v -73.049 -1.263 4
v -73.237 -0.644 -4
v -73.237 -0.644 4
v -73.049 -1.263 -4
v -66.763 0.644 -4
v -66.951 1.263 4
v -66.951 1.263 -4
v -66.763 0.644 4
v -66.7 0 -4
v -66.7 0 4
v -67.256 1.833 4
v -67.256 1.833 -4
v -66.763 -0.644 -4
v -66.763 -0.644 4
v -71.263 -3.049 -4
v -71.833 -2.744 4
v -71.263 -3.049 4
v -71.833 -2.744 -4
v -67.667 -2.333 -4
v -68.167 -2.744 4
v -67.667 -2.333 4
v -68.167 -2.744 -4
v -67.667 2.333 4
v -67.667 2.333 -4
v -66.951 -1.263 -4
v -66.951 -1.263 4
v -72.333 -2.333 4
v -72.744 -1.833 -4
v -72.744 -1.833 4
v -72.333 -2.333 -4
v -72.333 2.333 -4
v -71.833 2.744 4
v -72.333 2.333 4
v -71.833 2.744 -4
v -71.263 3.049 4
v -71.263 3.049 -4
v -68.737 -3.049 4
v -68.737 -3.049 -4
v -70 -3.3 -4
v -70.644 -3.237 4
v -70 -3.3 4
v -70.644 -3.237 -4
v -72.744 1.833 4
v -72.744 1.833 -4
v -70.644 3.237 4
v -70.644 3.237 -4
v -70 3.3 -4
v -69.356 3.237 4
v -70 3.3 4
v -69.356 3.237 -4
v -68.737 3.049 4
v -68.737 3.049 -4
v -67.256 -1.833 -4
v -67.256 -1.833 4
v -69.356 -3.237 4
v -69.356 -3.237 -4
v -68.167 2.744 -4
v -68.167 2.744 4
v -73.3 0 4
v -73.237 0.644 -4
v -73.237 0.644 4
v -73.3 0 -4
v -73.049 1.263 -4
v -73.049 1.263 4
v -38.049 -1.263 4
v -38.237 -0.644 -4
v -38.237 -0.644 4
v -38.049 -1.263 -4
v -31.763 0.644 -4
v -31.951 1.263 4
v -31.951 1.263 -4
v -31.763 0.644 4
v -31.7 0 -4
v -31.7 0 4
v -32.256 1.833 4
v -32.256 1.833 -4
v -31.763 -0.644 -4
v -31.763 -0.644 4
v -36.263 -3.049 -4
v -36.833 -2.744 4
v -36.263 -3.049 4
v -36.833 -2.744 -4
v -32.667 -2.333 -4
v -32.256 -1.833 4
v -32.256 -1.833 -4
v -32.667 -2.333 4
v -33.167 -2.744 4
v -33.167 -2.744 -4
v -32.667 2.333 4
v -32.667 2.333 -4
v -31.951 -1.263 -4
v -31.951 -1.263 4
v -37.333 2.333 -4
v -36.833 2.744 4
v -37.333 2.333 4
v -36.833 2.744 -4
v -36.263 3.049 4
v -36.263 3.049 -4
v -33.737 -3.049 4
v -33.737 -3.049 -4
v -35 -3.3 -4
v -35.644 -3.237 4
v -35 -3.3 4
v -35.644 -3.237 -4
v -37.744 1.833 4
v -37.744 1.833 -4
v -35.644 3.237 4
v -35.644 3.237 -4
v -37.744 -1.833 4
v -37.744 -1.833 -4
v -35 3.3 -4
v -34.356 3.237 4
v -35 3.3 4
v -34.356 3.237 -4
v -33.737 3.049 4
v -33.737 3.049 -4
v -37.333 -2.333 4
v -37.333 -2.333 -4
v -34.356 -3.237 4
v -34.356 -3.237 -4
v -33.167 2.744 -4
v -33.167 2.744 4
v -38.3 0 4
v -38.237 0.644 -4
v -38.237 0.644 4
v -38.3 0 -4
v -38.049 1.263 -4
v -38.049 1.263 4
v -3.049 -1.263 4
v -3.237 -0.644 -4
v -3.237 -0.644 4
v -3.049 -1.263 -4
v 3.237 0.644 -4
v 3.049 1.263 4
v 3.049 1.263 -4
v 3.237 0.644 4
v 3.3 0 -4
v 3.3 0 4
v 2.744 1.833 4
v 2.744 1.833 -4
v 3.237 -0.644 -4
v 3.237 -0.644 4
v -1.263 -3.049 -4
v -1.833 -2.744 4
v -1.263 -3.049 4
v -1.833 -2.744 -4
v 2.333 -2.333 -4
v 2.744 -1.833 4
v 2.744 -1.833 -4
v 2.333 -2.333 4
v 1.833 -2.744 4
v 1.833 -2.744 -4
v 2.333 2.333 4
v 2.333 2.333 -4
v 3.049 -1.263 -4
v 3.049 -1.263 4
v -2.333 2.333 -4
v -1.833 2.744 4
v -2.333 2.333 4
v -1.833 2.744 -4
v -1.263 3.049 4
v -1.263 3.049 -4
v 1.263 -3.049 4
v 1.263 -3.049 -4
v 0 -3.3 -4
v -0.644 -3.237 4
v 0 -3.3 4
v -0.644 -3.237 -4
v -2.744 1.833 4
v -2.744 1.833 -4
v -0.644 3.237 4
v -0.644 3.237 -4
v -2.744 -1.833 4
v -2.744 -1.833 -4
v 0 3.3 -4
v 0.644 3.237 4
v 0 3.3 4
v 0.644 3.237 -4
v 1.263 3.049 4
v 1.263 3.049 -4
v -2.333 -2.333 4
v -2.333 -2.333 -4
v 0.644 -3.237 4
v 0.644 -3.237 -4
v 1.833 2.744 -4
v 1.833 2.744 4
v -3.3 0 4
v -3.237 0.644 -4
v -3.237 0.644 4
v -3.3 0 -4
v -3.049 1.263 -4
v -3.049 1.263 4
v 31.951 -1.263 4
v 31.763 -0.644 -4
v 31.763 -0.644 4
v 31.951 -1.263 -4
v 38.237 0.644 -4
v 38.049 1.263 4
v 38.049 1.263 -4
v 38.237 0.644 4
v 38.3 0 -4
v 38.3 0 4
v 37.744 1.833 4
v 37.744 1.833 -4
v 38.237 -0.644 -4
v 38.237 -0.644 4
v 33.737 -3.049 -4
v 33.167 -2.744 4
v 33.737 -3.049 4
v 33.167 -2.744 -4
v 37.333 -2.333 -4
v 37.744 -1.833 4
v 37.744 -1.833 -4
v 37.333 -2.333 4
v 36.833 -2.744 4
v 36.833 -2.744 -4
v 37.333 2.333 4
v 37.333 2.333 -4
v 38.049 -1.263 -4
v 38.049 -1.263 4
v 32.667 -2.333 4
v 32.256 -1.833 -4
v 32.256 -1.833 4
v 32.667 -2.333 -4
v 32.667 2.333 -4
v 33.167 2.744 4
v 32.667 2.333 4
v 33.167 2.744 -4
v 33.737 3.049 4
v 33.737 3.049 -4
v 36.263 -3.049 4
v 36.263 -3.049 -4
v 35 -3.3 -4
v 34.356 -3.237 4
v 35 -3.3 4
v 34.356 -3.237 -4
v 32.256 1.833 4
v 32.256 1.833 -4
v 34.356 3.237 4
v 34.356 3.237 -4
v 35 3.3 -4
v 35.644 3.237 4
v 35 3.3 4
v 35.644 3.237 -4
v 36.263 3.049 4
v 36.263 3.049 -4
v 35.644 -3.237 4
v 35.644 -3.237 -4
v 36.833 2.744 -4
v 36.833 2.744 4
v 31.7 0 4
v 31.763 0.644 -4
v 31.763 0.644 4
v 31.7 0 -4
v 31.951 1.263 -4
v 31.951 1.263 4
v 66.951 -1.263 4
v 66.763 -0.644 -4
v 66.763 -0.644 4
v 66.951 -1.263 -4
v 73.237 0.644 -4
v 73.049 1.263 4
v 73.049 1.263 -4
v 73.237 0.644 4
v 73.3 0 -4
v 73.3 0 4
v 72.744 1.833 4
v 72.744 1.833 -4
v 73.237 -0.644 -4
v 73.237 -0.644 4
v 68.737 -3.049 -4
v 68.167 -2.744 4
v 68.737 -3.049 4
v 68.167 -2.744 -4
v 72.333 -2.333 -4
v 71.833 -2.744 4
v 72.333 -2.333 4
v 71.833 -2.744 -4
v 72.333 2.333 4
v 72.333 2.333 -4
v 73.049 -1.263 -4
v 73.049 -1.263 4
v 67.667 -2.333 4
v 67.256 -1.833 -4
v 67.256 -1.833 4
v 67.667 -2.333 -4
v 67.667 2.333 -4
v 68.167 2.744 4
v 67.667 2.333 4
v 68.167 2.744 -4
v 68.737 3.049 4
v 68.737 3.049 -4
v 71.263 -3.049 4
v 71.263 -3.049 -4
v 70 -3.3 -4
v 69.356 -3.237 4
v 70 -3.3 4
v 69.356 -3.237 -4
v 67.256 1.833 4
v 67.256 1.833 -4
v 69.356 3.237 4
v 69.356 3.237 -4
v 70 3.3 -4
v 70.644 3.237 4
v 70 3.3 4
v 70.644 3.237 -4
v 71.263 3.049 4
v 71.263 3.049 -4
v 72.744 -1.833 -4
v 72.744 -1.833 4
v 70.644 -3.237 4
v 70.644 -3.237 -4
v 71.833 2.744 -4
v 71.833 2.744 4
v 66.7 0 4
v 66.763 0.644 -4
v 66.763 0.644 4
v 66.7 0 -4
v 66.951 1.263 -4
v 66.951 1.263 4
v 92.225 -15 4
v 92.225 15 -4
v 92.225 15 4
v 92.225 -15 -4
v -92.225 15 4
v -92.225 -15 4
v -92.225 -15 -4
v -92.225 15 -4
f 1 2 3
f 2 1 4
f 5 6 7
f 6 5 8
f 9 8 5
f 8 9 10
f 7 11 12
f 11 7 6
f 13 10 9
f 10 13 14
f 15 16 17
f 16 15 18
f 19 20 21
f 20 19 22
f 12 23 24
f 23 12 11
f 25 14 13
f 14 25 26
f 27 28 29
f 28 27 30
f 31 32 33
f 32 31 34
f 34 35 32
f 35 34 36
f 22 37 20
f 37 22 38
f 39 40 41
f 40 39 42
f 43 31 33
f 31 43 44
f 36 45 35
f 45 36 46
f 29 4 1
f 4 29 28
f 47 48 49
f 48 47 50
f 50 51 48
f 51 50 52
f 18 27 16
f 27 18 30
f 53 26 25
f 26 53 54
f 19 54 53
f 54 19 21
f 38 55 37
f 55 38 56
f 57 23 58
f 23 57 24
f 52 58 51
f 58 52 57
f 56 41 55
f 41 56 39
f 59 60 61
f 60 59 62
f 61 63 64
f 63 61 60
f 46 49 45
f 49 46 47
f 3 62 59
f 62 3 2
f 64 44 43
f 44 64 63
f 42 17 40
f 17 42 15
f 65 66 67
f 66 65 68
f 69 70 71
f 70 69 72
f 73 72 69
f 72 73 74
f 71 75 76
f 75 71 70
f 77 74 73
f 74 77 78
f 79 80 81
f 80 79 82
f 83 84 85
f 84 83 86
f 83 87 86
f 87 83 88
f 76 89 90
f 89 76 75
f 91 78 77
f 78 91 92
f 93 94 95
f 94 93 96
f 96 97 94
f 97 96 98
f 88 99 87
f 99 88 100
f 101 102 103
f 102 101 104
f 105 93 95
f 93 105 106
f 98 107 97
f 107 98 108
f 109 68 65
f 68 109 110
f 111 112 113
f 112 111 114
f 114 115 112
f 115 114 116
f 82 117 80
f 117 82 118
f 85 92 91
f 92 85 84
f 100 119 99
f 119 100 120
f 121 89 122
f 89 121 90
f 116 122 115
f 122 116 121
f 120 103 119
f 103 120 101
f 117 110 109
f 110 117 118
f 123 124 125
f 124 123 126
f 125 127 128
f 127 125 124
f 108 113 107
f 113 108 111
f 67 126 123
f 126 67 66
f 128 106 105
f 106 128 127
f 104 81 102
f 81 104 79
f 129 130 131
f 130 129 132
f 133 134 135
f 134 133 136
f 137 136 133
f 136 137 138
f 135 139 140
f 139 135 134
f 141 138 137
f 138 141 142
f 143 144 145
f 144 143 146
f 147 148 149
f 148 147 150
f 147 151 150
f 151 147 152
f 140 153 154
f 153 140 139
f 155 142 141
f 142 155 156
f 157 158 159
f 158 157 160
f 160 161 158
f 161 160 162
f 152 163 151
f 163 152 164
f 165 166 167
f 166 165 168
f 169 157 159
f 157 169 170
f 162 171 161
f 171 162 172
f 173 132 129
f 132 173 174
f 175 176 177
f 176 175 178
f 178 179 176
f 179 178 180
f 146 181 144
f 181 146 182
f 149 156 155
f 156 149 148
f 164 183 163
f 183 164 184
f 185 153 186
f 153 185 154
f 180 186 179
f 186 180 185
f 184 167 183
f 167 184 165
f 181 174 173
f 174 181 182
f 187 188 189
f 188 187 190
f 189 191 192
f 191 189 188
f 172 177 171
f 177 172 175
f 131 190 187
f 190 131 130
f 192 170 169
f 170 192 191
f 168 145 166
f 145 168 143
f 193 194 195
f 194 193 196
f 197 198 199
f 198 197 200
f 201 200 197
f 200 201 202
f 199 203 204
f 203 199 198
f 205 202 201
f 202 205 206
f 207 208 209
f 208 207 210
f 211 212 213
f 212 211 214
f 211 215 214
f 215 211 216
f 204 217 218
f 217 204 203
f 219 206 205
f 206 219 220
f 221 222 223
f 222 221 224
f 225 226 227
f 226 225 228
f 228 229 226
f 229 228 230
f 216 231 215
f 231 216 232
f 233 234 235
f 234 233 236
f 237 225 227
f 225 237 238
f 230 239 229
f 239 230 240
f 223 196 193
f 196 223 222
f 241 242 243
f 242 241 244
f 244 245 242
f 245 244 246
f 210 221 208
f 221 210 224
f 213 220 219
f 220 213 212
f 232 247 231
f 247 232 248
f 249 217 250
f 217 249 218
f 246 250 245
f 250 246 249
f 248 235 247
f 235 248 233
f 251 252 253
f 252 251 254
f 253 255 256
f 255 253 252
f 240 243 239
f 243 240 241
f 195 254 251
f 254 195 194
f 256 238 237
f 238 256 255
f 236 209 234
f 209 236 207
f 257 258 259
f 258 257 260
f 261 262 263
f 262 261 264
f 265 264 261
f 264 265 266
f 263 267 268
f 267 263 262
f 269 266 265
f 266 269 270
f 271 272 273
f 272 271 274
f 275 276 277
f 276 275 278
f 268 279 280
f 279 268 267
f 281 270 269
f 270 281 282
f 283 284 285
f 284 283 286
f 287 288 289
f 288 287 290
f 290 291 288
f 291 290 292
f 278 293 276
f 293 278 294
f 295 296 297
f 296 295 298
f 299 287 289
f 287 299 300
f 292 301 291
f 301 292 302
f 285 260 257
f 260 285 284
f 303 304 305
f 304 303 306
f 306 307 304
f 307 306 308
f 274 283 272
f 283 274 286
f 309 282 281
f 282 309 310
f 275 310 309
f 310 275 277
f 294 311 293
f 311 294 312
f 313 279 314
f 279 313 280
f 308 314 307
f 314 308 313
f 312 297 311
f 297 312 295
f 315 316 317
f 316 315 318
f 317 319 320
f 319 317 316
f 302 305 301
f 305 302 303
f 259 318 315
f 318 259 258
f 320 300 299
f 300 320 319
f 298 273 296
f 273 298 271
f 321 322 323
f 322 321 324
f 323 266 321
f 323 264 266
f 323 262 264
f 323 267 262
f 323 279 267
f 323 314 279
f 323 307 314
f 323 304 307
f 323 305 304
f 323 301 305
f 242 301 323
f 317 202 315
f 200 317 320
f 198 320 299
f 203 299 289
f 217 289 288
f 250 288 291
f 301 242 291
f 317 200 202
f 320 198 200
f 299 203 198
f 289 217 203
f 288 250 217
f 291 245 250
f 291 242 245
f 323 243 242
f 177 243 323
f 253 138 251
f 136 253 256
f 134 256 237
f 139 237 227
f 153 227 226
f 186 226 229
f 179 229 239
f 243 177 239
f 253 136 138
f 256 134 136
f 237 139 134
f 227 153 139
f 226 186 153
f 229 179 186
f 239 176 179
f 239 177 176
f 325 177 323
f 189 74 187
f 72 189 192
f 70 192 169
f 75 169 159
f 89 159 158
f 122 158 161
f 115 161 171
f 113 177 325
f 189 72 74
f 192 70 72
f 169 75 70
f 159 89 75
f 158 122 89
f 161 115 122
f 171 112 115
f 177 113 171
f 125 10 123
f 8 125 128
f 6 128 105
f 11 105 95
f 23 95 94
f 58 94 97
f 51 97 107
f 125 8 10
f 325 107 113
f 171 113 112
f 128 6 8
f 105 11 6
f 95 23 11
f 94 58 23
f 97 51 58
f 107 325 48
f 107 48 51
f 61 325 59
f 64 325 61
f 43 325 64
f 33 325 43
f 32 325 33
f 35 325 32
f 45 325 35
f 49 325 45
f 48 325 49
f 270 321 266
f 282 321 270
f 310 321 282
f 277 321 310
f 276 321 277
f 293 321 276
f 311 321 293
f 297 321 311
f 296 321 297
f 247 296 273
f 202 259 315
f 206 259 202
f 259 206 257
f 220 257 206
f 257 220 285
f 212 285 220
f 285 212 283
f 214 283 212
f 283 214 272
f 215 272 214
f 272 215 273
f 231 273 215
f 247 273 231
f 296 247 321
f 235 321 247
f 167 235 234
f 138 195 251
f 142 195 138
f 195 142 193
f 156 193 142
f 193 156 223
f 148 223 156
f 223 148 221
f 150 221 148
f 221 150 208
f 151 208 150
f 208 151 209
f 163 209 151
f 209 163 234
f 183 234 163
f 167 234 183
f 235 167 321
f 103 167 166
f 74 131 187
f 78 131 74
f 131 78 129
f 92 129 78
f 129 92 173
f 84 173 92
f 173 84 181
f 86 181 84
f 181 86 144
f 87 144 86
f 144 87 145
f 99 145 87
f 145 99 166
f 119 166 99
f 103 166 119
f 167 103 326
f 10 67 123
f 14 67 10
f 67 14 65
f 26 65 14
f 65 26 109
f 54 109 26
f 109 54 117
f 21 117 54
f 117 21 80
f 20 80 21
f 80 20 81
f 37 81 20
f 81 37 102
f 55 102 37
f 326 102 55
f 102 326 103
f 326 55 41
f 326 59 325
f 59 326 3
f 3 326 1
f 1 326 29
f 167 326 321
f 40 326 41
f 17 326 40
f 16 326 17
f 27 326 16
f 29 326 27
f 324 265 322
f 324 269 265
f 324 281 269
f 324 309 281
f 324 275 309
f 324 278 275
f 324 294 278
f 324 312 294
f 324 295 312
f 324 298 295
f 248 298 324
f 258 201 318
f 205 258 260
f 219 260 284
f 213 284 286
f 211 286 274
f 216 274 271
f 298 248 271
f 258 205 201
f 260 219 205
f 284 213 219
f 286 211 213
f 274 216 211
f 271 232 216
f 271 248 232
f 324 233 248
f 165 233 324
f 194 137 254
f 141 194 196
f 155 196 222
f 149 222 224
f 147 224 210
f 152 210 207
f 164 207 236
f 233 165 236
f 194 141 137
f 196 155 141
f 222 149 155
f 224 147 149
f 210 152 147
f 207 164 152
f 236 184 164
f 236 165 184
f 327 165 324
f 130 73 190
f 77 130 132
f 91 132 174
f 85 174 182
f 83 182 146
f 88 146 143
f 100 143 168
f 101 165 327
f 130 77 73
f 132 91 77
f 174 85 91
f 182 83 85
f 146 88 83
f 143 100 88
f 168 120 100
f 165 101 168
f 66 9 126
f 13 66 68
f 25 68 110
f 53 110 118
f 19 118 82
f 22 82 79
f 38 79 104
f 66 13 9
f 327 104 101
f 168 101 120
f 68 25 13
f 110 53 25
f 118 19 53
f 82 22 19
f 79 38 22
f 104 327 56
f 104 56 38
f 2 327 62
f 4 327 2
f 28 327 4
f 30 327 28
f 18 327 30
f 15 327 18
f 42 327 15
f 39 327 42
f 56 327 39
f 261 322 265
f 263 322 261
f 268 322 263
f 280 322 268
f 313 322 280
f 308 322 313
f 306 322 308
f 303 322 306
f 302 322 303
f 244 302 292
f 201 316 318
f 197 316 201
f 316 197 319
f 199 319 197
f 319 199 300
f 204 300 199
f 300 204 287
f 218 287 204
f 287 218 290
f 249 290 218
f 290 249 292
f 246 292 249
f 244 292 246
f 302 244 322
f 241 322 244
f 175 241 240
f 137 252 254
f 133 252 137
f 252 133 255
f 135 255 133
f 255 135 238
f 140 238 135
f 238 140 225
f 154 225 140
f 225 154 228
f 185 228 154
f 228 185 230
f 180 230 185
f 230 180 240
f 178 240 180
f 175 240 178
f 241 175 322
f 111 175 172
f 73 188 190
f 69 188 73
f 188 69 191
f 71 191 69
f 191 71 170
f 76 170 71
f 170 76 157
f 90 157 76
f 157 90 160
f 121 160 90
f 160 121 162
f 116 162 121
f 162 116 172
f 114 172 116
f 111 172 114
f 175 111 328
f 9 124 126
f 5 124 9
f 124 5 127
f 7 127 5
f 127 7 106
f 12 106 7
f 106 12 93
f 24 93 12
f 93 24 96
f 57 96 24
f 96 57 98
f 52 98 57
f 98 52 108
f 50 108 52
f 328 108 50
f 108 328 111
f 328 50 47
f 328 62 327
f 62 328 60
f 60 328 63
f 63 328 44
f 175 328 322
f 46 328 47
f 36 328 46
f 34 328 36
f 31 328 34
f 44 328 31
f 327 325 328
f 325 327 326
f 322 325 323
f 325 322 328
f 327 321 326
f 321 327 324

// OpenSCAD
$fn = 32;

// ----------------------------------------------------------------------
// Hole bar, 5 x Ø6.6
// row layout, 22.225 mm edge offset
// ----------------------------------------------------------------------

// --- parameters (mm) ---
bar_w = 30;     // bar width (Y)
bar_t = 8;      // bar thickness (Z)
holes = 5;      // holes per row
hole_d = 6.6;   // hole diameter
edge = 22.225;  // offset from the bar end to the first hole
pitch = 35;     // pitch between neighbouring holes

// --- derived feature positions (mm) ---
span = (holes - 1) * pitch;   // = 140   distance between the end holes
bar_l = span + 2 * edge;      // = 184.45   overall bar length
start_x = -bar_l / 2 + edge;  // = -70   X of the first hole
feature_centers = [
  [start_x + 0 * pitch, 0],
  [start_x + 1 * pitch, 0],
  [start_x + 2 * pitch, 0],
  [start_x + 3 * pitch, 0],
  [start_x + 4 * pitch, 0]
];   // hole centres of the first row

// bar with one row of holes, drilled from feature_centers
difference() {
  translate([-bar_l / 2, -bar_w / 2, -bar_t / 2]) cube([bar_l, bar_w, bar_t]);
  for (centre = feature_centers)
    translate([centre[0], centre[1], 0])
      cylinder(d = hole_d, h = bar_t + 2, center = true);
}
